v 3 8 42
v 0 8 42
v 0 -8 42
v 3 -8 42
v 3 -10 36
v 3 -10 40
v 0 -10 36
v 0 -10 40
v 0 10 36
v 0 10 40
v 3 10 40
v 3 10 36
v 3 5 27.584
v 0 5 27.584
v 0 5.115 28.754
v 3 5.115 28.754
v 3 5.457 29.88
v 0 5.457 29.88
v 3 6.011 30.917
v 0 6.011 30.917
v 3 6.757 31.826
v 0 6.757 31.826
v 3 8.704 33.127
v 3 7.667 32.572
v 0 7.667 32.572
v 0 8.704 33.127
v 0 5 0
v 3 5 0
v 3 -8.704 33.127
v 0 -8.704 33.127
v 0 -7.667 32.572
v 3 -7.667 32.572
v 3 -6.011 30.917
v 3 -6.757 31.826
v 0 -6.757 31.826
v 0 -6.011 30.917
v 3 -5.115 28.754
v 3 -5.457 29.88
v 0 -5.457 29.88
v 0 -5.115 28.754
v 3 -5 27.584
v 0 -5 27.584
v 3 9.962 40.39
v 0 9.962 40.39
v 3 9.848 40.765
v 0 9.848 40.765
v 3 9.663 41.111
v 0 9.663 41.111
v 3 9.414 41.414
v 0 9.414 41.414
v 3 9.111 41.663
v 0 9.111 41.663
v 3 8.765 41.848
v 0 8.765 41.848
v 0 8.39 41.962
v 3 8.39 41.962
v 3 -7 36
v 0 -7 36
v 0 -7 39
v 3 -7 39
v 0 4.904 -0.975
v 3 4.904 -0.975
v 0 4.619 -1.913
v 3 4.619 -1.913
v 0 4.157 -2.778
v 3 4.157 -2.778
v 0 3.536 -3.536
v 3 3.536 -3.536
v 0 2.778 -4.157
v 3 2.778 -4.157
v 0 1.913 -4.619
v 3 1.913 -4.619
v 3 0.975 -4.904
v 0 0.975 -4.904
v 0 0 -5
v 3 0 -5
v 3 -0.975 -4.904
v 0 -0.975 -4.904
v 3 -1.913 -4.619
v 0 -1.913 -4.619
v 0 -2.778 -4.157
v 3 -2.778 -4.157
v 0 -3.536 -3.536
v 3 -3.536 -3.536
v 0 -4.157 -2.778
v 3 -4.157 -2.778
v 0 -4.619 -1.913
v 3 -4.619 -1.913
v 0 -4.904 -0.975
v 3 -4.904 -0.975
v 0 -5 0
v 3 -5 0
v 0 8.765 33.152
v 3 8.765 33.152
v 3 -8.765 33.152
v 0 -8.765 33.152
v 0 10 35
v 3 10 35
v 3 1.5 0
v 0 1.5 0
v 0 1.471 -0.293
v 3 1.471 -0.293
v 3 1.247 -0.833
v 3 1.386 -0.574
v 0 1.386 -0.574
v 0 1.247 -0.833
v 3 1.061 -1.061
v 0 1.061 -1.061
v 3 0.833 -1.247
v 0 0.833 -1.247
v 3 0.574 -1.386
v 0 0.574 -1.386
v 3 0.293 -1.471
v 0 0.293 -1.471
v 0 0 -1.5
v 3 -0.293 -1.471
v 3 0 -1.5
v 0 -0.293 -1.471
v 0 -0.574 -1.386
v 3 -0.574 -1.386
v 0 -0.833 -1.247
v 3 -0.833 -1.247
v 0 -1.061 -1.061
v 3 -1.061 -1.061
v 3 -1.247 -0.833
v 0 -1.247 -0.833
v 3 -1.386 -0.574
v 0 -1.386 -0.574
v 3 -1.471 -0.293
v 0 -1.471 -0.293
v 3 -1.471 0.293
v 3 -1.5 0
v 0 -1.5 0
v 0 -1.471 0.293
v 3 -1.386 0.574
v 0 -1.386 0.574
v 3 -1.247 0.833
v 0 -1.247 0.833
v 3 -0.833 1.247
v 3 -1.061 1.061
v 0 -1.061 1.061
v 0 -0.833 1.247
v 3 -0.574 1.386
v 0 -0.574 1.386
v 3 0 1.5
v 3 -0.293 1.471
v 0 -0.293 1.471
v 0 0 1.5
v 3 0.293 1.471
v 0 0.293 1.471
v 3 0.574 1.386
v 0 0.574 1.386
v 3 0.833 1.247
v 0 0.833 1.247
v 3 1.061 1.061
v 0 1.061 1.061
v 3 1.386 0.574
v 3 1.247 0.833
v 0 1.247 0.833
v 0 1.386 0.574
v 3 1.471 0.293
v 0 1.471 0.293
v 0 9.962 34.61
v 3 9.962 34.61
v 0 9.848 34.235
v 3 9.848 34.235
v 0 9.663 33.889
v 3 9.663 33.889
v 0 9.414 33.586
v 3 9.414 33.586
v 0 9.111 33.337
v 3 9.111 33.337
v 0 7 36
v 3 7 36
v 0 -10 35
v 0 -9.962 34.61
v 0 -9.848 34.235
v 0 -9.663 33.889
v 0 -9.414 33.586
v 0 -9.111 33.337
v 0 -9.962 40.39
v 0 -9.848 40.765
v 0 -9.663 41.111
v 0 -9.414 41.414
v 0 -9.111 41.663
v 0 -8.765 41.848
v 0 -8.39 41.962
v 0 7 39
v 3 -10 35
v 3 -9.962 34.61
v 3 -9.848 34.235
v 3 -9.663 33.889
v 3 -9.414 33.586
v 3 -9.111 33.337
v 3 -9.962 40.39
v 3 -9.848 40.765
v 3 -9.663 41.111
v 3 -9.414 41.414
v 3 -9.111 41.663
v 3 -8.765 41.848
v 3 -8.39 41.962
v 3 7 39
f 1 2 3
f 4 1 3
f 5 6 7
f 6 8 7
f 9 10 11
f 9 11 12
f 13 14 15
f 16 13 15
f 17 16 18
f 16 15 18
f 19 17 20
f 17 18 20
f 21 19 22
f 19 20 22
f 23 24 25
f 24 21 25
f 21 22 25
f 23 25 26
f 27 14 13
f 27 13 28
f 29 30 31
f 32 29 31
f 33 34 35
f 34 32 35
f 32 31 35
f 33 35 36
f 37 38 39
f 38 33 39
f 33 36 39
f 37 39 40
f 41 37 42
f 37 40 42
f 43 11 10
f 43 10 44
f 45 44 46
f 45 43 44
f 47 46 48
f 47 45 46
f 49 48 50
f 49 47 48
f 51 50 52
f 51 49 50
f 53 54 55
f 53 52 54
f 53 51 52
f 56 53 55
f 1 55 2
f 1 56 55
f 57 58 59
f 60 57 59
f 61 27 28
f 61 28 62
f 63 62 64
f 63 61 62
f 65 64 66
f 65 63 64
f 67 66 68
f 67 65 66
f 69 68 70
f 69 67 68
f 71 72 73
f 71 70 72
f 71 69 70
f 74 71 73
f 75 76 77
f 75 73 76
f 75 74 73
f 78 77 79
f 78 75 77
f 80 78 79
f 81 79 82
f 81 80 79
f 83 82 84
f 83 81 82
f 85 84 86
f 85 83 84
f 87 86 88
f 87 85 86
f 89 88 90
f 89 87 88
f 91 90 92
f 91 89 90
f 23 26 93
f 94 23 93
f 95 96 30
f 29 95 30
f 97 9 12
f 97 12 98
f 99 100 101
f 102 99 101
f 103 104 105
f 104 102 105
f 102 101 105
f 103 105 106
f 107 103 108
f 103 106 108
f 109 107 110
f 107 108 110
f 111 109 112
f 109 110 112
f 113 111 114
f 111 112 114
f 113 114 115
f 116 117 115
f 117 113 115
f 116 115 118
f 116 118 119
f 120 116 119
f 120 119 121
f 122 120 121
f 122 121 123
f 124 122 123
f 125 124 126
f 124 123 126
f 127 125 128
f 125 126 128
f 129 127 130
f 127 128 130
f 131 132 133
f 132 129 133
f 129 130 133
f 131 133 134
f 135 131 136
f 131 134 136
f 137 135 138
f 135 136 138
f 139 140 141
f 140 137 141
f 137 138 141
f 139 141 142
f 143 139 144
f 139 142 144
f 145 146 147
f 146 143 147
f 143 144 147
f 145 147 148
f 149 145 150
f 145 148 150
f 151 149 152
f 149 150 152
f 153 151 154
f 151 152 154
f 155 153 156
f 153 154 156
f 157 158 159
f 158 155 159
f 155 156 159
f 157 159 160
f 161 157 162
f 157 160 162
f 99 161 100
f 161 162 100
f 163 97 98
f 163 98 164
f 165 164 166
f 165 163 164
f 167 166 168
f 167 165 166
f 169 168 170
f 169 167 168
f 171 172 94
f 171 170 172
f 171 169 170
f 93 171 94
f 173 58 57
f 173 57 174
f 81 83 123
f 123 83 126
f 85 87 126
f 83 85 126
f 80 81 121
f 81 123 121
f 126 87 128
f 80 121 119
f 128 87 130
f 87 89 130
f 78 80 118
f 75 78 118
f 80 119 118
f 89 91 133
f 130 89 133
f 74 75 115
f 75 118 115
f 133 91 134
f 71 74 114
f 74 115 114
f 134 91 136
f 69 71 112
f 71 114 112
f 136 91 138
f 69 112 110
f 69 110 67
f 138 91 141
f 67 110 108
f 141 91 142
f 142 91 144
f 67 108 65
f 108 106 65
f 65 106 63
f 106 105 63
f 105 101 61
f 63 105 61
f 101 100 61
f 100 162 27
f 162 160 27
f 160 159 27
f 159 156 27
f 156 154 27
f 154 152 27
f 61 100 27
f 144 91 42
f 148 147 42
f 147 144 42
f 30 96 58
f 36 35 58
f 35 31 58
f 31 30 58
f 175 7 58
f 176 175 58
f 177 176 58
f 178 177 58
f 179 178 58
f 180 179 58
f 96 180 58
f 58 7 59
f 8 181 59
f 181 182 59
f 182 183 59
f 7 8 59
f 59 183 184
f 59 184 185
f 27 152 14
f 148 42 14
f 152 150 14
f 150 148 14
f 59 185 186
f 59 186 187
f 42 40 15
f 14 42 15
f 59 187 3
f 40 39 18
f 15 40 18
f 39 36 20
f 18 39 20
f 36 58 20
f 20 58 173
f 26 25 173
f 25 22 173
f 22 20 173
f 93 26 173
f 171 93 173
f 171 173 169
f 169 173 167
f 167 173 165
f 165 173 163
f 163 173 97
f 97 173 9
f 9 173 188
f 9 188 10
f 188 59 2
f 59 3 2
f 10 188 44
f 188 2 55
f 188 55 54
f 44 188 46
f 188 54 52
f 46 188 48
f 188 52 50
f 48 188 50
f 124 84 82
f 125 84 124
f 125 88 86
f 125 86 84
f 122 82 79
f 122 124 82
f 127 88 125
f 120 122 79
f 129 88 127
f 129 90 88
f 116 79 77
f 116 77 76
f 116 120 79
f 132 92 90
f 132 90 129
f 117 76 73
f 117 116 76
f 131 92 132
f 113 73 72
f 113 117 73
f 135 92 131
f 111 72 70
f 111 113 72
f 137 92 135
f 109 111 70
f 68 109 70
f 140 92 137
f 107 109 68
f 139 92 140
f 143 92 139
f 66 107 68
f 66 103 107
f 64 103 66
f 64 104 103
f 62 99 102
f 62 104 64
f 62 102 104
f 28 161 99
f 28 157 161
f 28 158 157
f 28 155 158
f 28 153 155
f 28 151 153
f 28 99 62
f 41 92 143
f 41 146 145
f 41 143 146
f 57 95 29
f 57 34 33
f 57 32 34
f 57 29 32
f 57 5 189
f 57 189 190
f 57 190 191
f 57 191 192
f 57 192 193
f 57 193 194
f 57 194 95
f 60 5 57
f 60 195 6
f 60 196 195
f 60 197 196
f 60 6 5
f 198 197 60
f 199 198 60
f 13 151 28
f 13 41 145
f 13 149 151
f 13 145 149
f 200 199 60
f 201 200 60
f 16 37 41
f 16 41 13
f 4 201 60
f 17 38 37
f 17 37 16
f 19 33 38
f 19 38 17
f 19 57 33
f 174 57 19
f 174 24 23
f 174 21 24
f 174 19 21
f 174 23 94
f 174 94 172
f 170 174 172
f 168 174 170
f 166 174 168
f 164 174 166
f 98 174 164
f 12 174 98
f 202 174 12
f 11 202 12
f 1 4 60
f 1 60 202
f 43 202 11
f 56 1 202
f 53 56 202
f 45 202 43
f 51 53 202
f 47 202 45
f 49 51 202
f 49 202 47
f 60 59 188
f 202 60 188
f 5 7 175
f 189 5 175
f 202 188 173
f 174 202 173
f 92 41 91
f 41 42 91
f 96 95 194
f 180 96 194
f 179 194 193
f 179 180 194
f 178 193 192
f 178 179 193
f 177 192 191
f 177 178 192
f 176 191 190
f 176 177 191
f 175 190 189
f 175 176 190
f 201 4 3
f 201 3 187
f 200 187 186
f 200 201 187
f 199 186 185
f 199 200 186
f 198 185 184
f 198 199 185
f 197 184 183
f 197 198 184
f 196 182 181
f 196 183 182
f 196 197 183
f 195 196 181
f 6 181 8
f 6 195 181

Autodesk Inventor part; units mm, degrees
ref_plane "YZ Plane" through (0, 0, 0) normal (1, 0, 0) x (0, 1, 0)
ref_plane "XZ Plane" through (0, 0, 0) normal (0, 1, 0) x (-1, 0, 0)
ref_plane "XY Plane" through (0, 0, 0) normal (0, 0, 1) x (1, 0, 0)
sketch "Sketch1" plane through (0, 0, 0) normal (1, 0, 0) x (0, 1, 0)
  line L0 (-8.7654, 33.1522) -> (-8.7039, 33.1268)
  line L1 (8.7039, 33.1268) -> (8.7654, 33.1522)
  line L2 (-5, 27.5835) -> (-5, 0)
  line L3 (5, 27.5835) -> (5, 0)
  arc A0 (-5, 27.5835) -> (-8.7039, 33.1268) centre (-11, 27.5835) ccw
  arc A1 (8.7039, 33.1268) -> (5, 27.5835) centre (11, 27.5835) ccw
  line L4 (-7, 36) -> (7, 36)
  line L5 (-10, 36) -> (-10, 35)
  line L6 (10, 36) -> (10, 35)
  circle A2 centre (0, 0) radius 46 construction
  arc A3 (-10, 35) -> (-8.7654, 33.1522) centre (-8, 35) ccw
  arc A4 (8.7654, 33.1522) -> (10, 35) centre (8, 35) ccw
  circle A5 centre (0, 0) radius 1.5
  arc A6 (-5, 0) -> (5, 0) centre (0, 0) ccw
  line L7 (0, 0) -> (0, 36) construction
  line L8 (-10, 36) -> (-9.7321, 36)
  line L9 (10, 42) -> (-10, 42)
  line L10 (-10, 42) -> (-10, 36)
  line L11 (10, 36) -> (9.7321, 36)
  line L12 (10, 42) -> (10, 36)
  line L13 (-7, 36) -> (-7, 39)
  line L14 (-7, 39) -> (7, 39)
  line L15 (7, 39) -> (7, 36)
  point P0 (-5, 31.5926)
  point P1 (5, 31.5926)
  dimension "d25" = 10
  dimension "d32" = 6
  dimension "d33" = 6
  dimension "d82" = 46
  dimension "d90" = 2
  dimension "d93" = 1
  dimension "d95" = 22.5
  dimension "d109" = 3
  dimension "d112" = 36
  dimension "d113" = 5
  dimension "d115" = 20
  dimension "d118" = 6
  dimension "d120" = 6
extrude "Extrusion10" add sketch "Sketch1" along normal blind 3
fillet "Fillet1" radius 2 2 edges at (1.5, -10, 42) (1.5, 10, 42)
properties part number "27030914CameraMountA-2"
